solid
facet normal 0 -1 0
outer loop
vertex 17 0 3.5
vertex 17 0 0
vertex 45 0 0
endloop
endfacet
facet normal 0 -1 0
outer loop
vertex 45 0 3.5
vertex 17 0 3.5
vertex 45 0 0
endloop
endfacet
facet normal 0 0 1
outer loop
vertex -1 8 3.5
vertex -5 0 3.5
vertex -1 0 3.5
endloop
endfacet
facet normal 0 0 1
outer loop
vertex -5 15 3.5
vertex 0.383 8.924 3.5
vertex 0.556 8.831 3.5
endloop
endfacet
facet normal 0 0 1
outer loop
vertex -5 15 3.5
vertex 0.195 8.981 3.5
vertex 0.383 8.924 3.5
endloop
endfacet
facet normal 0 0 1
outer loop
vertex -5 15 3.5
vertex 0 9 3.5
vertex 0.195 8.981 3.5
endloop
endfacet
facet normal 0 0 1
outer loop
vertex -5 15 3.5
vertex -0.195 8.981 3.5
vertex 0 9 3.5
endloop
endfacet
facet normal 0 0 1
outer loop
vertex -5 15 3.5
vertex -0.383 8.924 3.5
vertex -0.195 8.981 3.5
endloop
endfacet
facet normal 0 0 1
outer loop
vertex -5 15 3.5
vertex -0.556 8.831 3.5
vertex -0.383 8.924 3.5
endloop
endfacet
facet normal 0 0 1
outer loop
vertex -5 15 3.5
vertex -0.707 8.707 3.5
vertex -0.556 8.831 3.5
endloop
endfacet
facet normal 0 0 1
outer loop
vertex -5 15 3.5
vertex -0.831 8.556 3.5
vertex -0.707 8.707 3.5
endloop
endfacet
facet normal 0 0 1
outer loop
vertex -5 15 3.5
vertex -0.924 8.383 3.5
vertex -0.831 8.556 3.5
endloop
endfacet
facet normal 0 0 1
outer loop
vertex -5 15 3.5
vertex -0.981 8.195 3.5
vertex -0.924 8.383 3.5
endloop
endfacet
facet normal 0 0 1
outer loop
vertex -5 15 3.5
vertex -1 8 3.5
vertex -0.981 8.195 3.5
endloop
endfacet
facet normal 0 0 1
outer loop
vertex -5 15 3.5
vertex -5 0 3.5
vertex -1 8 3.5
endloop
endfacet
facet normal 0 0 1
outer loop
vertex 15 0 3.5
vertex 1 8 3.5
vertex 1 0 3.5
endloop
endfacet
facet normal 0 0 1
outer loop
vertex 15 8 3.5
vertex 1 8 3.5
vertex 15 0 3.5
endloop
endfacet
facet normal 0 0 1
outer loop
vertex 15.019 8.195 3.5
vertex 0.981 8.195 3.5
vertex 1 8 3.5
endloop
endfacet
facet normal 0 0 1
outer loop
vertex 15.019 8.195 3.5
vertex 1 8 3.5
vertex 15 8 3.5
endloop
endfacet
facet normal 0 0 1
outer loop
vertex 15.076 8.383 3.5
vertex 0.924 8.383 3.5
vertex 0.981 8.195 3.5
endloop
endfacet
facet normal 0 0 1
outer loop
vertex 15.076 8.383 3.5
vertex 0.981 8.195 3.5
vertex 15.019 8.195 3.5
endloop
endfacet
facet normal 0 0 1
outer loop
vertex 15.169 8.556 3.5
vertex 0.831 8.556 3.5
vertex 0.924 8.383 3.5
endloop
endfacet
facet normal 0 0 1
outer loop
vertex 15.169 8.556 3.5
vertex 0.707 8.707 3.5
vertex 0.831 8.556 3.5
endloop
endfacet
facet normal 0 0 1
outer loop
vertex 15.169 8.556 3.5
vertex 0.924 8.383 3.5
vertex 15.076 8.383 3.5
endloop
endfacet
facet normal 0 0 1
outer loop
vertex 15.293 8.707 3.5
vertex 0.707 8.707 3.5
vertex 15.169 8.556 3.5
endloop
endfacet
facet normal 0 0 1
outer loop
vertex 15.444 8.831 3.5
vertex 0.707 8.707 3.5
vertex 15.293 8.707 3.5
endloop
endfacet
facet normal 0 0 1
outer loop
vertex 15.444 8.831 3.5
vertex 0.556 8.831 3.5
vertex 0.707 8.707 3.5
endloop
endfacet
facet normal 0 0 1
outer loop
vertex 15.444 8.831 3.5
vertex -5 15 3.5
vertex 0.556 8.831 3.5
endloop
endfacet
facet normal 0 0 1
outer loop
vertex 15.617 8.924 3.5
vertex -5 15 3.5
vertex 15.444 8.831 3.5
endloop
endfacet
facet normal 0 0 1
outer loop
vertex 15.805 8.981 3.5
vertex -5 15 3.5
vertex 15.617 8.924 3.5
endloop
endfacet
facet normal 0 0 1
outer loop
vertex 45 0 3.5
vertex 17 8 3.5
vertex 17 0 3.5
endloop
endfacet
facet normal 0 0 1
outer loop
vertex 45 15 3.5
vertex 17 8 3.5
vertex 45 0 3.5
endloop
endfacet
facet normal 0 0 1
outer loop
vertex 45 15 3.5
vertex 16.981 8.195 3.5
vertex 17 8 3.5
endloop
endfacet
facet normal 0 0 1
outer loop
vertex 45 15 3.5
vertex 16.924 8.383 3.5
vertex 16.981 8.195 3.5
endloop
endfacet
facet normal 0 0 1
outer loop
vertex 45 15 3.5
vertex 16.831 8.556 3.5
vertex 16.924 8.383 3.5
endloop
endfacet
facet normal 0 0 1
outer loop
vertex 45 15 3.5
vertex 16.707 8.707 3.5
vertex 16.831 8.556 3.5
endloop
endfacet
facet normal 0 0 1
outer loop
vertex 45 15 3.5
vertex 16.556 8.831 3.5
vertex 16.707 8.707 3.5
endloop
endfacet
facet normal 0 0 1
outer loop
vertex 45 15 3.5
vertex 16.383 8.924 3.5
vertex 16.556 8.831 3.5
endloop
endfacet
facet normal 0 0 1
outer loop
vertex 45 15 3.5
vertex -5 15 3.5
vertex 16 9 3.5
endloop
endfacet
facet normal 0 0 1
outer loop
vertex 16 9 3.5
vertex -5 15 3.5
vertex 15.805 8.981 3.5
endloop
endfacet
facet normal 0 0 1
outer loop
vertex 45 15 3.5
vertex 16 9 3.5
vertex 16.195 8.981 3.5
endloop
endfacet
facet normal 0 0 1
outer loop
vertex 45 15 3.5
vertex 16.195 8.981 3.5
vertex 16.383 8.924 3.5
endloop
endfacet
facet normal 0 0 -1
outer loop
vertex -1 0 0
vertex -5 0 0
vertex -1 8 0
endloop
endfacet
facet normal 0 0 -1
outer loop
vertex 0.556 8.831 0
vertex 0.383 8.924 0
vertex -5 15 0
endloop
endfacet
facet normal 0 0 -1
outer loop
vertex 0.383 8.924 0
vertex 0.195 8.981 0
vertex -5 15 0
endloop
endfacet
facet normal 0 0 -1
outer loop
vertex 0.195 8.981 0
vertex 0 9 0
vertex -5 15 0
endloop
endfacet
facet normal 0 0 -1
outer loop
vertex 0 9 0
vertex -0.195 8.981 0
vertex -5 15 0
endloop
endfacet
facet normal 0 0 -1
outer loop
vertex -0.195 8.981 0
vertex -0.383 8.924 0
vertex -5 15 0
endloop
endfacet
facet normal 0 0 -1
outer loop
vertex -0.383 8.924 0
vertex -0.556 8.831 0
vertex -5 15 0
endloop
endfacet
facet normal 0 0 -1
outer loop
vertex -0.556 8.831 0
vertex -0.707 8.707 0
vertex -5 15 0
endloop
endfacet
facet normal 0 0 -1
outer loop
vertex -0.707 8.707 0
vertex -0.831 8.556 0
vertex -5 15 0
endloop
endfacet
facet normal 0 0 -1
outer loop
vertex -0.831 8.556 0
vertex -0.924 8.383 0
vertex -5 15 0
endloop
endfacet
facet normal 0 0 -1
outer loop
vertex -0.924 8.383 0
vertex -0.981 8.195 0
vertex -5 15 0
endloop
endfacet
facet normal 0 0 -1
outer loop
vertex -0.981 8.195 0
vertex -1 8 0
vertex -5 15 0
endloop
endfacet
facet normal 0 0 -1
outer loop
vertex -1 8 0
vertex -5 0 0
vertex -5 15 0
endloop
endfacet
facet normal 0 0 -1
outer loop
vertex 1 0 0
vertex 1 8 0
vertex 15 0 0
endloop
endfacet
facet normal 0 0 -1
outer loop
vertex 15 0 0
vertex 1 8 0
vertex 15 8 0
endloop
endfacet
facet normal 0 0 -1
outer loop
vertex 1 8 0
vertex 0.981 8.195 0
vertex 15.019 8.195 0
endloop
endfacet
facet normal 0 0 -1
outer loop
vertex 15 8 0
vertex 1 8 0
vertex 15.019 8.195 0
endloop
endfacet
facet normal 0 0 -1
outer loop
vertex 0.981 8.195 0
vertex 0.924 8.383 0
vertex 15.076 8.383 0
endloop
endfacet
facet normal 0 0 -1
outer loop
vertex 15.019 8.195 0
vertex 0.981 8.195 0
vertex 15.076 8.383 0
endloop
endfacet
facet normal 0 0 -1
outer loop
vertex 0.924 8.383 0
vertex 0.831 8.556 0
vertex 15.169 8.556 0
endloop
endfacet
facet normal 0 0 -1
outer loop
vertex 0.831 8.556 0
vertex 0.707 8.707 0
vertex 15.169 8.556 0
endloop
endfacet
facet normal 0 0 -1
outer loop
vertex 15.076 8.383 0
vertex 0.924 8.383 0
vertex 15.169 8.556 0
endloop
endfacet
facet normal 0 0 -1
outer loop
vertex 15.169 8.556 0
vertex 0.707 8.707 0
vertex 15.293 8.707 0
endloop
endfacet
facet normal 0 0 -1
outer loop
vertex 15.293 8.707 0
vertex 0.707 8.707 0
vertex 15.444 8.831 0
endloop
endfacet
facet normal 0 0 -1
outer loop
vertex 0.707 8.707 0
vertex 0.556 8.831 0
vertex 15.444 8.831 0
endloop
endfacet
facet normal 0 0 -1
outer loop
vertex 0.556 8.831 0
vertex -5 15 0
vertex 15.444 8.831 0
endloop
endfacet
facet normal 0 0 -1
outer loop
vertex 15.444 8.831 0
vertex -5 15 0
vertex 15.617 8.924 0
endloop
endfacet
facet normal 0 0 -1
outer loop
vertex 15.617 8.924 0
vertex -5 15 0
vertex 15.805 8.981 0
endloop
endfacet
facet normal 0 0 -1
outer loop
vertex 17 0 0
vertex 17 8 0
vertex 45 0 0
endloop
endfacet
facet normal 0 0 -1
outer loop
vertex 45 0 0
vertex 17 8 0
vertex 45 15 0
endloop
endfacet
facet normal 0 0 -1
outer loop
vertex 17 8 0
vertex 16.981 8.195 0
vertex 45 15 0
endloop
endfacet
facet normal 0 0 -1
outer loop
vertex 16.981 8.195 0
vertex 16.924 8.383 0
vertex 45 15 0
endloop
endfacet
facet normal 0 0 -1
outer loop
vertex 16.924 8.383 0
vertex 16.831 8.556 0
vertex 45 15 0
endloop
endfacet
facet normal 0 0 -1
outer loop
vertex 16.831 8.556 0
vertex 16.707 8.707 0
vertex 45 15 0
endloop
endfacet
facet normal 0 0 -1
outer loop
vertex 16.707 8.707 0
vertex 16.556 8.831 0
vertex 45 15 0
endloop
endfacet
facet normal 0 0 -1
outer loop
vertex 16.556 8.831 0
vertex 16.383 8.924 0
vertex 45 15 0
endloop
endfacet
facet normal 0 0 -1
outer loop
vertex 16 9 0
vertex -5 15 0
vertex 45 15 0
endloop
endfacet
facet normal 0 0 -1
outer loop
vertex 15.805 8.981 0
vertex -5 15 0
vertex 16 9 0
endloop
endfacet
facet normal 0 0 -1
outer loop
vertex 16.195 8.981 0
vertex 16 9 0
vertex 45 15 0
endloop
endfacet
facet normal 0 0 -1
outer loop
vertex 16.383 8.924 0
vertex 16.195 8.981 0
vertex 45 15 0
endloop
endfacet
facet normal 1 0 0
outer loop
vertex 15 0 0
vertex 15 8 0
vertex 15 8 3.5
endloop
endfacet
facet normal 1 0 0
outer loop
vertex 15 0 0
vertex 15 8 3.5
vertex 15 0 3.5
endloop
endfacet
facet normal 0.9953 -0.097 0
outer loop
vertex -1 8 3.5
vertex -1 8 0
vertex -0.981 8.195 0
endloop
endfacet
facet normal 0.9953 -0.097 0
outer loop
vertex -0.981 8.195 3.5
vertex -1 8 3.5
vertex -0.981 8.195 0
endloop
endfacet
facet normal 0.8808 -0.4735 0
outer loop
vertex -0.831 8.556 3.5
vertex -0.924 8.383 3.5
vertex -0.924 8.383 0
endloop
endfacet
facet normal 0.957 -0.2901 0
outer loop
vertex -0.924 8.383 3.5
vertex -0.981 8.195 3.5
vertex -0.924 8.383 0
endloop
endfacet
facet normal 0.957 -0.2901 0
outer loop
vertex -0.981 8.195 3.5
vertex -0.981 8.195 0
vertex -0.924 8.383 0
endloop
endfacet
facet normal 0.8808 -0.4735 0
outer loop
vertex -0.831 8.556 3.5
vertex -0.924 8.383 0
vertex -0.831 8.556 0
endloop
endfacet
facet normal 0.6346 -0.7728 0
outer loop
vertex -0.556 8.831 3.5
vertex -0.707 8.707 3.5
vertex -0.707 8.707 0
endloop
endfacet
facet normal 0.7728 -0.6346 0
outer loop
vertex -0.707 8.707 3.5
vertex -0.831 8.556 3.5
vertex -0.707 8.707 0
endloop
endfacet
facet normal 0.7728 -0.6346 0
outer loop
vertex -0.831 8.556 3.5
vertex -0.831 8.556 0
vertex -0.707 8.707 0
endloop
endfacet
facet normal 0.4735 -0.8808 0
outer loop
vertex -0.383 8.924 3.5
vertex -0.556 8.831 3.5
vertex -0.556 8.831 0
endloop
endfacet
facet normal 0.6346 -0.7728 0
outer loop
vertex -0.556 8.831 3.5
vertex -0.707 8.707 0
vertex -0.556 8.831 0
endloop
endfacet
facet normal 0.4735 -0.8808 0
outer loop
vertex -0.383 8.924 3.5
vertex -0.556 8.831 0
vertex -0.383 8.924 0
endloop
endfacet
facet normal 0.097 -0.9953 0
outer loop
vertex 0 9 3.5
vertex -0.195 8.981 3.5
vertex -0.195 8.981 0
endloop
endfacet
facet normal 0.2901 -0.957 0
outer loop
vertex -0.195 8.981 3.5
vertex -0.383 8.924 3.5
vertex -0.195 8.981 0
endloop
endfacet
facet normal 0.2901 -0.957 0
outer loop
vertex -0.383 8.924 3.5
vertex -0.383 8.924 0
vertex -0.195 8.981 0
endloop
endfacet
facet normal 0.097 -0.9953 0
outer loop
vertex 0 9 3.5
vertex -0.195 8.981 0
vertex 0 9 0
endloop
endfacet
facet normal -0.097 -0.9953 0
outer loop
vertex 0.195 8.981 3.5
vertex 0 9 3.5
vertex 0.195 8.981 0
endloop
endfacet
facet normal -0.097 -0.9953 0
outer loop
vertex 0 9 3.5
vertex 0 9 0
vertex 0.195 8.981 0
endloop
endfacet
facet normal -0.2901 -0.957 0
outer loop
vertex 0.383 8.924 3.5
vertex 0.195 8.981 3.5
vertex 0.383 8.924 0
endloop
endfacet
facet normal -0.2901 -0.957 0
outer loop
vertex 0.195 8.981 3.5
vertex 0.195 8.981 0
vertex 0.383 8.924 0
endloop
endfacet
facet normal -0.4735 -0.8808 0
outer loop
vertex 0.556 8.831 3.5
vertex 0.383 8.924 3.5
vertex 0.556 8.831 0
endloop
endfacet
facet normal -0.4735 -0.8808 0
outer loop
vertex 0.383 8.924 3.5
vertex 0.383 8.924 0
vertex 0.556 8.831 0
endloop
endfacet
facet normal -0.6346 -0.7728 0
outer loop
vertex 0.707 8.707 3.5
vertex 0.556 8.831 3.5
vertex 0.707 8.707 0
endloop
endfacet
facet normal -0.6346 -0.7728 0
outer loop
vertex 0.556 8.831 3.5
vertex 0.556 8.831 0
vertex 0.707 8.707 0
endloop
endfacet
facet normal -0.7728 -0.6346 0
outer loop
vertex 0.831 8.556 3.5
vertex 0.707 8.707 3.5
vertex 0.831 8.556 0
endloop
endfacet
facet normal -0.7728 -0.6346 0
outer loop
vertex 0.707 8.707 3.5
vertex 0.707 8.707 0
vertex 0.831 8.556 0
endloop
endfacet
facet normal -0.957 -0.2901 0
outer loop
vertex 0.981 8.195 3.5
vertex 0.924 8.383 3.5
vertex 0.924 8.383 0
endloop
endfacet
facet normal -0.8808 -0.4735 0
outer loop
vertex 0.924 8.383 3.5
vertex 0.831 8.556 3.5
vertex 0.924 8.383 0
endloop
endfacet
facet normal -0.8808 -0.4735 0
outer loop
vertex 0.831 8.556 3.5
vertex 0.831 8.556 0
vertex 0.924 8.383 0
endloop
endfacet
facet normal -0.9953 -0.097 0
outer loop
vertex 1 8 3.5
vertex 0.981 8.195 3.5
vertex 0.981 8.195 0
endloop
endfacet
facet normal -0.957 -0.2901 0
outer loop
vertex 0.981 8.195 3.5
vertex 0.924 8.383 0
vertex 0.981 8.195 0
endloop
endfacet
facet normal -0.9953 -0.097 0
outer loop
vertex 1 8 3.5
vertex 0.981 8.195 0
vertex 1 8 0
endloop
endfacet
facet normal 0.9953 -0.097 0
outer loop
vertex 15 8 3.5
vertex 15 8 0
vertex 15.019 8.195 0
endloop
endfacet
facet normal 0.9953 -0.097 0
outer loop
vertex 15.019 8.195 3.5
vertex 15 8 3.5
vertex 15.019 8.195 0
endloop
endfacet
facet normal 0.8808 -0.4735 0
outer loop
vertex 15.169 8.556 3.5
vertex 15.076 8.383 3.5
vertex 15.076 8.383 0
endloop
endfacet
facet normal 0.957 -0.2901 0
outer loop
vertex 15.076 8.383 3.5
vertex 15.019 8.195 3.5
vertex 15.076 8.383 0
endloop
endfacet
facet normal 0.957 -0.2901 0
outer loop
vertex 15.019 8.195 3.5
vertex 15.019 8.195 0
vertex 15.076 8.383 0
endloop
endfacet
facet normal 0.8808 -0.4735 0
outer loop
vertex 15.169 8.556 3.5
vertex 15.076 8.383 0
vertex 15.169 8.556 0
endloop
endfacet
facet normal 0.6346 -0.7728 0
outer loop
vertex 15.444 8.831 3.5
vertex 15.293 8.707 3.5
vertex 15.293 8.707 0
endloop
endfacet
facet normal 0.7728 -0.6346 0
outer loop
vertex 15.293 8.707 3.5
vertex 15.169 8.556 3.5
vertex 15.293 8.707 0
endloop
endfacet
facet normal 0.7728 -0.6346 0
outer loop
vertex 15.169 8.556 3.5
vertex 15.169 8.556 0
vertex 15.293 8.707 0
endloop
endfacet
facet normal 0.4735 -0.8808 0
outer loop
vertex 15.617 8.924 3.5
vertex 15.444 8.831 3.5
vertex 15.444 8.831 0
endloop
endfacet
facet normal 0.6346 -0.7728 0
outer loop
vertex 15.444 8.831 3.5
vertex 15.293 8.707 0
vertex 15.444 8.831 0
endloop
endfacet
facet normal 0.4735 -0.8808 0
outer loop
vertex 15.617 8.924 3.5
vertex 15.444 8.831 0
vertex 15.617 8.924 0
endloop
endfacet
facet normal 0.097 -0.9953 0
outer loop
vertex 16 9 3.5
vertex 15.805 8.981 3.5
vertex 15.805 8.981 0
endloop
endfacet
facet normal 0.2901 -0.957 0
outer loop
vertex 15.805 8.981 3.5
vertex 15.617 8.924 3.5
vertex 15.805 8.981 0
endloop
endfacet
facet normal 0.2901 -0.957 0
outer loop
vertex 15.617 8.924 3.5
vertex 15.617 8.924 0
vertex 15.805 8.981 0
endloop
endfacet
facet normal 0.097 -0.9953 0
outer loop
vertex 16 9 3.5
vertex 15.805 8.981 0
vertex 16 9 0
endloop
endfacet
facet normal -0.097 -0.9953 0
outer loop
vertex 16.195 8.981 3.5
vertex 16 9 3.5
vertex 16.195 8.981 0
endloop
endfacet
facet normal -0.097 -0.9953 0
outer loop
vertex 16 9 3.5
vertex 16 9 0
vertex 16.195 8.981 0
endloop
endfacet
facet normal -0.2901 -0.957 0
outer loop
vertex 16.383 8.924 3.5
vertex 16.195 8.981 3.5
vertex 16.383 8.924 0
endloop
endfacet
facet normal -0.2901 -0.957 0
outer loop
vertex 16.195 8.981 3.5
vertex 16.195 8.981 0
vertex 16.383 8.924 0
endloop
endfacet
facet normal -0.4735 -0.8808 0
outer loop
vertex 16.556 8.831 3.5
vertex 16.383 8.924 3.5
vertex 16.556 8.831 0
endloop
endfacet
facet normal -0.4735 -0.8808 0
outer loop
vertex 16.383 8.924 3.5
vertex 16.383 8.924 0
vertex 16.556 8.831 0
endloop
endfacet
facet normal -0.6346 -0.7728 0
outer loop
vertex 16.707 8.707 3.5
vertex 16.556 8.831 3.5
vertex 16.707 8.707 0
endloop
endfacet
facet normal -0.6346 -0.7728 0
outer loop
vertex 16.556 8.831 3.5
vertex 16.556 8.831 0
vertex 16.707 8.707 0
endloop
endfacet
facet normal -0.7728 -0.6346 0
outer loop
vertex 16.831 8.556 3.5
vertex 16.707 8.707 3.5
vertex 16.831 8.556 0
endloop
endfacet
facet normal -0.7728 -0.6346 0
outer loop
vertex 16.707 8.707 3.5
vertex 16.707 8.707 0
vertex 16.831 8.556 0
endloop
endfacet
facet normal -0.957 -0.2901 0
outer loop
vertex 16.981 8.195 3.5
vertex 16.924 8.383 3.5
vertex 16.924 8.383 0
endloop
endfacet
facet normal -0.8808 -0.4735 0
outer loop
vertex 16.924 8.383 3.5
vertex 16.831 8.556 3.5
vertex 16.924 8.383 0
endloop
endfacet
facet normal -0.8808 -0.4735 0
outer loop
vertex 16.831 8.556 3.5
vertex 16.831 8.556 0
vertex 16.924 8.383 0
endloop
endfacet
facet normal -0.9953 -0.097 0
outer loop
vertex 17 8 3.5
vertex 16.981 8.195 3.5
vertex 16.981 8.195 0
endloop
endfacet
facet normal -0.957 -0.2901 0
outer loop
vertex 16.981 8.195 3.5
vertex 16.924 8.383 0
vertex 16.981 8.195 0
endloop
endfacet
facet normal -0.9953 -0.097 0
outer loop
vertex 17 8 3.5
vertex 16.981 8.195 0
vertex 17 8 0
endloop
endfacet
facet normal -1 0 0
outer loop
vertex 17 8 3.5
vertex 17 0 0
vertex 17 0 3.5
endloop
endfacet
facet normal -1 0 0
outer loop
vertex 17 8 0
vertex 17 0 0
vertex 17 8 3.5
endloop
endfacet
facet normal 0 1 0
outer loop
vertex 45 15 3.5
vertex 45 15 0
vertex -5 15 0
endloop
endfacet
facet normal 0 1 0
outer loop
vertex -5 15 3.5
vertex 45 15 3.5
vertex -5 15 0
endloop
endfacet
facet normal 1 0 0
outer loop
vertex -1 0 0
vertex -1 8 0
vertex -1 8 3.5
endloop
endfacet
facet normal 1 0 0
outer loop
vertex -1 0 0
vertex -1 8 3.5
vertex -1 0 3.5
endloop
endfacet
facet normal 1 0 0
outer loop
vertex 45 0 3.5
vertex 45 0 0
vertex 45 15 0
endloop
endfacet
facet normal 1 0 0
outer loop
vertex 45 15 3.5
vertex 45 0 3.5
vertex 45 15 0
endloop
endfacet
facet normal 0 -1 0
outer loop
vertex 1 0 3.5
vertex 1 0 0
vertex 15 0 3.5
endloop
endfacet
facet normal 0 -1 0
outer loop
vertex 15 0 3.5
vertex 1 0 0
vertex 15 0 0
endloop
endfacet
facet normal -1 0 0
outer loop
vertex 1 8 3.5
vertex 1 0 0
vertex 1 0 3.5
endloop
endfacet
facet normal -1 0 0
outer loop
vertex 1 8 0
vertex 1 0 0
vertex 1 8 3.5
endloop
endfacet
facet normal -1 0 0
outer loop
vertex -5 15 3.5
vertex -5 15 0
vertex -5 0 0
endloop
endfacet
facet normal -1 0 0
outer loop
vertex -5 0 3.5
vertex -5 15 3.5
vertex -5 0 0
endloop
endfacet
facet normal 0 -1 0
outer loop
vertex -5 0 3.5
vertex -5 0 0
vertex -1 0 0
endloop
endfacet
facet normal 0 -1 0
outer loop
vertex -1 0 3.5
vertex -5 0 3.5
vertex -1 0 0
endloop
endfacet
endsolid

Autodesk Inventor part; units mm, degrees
ref_plane "YZ Plane" through (0, 0, 0) normal (1, 0, 0) x (0, 1, 0)
ref_plane "XZ Plane" through (0, 0, 0) normal (0, 1, 0) x (-1, 0, 0)
ref_plane "XY Plane" through (0, 0, 0) normal (0, 0, 1) x (1, 0, 0)
sketch "Sketch1" plane through (0, 0, 0) normal (0, 0, 1) x (1, 0, 0)
  line L0 (45, 15) -> (-5, 15)
  line L1 (-1, 8) -> (-1, 0)
  line L2 (1, 0) -> (1, 8)
  arc A0 (1, 8) -> (-1, 8) centre (0, 8) ccw
  arc A1 (17, 8) -> (15, 8) centre (16, 8) ccw
  line L3 (15, 8) -> (15, 0)
  line L4 (17, 0) -> (17, 8)
  line L5 (2.5, 0) -> (2.5, 0)
  line L6 (22.48, 0) -> (22.48, 0)
  line L7 (-5, 15) -> (-5, 0)
  line L8 (-5, 0) -> (-1, 0)
  line L9 (45, 0) -> (45, 15)
  line L10 (17, 0) -> (45, 0)
  line L11 (1, 0) -> (15, 0)
  point P0 (0, 0)
  point P1 (15, 0)
  dimension "d0" = 50
  dimension "d1" = 15
  dimension "d3" = 2
  dimension "d6" = 0
  dimension "d7" = 16
extrude "Extrusion2" add sketch "Sketch1" along normal blind 3.5
properties part number "C2"
